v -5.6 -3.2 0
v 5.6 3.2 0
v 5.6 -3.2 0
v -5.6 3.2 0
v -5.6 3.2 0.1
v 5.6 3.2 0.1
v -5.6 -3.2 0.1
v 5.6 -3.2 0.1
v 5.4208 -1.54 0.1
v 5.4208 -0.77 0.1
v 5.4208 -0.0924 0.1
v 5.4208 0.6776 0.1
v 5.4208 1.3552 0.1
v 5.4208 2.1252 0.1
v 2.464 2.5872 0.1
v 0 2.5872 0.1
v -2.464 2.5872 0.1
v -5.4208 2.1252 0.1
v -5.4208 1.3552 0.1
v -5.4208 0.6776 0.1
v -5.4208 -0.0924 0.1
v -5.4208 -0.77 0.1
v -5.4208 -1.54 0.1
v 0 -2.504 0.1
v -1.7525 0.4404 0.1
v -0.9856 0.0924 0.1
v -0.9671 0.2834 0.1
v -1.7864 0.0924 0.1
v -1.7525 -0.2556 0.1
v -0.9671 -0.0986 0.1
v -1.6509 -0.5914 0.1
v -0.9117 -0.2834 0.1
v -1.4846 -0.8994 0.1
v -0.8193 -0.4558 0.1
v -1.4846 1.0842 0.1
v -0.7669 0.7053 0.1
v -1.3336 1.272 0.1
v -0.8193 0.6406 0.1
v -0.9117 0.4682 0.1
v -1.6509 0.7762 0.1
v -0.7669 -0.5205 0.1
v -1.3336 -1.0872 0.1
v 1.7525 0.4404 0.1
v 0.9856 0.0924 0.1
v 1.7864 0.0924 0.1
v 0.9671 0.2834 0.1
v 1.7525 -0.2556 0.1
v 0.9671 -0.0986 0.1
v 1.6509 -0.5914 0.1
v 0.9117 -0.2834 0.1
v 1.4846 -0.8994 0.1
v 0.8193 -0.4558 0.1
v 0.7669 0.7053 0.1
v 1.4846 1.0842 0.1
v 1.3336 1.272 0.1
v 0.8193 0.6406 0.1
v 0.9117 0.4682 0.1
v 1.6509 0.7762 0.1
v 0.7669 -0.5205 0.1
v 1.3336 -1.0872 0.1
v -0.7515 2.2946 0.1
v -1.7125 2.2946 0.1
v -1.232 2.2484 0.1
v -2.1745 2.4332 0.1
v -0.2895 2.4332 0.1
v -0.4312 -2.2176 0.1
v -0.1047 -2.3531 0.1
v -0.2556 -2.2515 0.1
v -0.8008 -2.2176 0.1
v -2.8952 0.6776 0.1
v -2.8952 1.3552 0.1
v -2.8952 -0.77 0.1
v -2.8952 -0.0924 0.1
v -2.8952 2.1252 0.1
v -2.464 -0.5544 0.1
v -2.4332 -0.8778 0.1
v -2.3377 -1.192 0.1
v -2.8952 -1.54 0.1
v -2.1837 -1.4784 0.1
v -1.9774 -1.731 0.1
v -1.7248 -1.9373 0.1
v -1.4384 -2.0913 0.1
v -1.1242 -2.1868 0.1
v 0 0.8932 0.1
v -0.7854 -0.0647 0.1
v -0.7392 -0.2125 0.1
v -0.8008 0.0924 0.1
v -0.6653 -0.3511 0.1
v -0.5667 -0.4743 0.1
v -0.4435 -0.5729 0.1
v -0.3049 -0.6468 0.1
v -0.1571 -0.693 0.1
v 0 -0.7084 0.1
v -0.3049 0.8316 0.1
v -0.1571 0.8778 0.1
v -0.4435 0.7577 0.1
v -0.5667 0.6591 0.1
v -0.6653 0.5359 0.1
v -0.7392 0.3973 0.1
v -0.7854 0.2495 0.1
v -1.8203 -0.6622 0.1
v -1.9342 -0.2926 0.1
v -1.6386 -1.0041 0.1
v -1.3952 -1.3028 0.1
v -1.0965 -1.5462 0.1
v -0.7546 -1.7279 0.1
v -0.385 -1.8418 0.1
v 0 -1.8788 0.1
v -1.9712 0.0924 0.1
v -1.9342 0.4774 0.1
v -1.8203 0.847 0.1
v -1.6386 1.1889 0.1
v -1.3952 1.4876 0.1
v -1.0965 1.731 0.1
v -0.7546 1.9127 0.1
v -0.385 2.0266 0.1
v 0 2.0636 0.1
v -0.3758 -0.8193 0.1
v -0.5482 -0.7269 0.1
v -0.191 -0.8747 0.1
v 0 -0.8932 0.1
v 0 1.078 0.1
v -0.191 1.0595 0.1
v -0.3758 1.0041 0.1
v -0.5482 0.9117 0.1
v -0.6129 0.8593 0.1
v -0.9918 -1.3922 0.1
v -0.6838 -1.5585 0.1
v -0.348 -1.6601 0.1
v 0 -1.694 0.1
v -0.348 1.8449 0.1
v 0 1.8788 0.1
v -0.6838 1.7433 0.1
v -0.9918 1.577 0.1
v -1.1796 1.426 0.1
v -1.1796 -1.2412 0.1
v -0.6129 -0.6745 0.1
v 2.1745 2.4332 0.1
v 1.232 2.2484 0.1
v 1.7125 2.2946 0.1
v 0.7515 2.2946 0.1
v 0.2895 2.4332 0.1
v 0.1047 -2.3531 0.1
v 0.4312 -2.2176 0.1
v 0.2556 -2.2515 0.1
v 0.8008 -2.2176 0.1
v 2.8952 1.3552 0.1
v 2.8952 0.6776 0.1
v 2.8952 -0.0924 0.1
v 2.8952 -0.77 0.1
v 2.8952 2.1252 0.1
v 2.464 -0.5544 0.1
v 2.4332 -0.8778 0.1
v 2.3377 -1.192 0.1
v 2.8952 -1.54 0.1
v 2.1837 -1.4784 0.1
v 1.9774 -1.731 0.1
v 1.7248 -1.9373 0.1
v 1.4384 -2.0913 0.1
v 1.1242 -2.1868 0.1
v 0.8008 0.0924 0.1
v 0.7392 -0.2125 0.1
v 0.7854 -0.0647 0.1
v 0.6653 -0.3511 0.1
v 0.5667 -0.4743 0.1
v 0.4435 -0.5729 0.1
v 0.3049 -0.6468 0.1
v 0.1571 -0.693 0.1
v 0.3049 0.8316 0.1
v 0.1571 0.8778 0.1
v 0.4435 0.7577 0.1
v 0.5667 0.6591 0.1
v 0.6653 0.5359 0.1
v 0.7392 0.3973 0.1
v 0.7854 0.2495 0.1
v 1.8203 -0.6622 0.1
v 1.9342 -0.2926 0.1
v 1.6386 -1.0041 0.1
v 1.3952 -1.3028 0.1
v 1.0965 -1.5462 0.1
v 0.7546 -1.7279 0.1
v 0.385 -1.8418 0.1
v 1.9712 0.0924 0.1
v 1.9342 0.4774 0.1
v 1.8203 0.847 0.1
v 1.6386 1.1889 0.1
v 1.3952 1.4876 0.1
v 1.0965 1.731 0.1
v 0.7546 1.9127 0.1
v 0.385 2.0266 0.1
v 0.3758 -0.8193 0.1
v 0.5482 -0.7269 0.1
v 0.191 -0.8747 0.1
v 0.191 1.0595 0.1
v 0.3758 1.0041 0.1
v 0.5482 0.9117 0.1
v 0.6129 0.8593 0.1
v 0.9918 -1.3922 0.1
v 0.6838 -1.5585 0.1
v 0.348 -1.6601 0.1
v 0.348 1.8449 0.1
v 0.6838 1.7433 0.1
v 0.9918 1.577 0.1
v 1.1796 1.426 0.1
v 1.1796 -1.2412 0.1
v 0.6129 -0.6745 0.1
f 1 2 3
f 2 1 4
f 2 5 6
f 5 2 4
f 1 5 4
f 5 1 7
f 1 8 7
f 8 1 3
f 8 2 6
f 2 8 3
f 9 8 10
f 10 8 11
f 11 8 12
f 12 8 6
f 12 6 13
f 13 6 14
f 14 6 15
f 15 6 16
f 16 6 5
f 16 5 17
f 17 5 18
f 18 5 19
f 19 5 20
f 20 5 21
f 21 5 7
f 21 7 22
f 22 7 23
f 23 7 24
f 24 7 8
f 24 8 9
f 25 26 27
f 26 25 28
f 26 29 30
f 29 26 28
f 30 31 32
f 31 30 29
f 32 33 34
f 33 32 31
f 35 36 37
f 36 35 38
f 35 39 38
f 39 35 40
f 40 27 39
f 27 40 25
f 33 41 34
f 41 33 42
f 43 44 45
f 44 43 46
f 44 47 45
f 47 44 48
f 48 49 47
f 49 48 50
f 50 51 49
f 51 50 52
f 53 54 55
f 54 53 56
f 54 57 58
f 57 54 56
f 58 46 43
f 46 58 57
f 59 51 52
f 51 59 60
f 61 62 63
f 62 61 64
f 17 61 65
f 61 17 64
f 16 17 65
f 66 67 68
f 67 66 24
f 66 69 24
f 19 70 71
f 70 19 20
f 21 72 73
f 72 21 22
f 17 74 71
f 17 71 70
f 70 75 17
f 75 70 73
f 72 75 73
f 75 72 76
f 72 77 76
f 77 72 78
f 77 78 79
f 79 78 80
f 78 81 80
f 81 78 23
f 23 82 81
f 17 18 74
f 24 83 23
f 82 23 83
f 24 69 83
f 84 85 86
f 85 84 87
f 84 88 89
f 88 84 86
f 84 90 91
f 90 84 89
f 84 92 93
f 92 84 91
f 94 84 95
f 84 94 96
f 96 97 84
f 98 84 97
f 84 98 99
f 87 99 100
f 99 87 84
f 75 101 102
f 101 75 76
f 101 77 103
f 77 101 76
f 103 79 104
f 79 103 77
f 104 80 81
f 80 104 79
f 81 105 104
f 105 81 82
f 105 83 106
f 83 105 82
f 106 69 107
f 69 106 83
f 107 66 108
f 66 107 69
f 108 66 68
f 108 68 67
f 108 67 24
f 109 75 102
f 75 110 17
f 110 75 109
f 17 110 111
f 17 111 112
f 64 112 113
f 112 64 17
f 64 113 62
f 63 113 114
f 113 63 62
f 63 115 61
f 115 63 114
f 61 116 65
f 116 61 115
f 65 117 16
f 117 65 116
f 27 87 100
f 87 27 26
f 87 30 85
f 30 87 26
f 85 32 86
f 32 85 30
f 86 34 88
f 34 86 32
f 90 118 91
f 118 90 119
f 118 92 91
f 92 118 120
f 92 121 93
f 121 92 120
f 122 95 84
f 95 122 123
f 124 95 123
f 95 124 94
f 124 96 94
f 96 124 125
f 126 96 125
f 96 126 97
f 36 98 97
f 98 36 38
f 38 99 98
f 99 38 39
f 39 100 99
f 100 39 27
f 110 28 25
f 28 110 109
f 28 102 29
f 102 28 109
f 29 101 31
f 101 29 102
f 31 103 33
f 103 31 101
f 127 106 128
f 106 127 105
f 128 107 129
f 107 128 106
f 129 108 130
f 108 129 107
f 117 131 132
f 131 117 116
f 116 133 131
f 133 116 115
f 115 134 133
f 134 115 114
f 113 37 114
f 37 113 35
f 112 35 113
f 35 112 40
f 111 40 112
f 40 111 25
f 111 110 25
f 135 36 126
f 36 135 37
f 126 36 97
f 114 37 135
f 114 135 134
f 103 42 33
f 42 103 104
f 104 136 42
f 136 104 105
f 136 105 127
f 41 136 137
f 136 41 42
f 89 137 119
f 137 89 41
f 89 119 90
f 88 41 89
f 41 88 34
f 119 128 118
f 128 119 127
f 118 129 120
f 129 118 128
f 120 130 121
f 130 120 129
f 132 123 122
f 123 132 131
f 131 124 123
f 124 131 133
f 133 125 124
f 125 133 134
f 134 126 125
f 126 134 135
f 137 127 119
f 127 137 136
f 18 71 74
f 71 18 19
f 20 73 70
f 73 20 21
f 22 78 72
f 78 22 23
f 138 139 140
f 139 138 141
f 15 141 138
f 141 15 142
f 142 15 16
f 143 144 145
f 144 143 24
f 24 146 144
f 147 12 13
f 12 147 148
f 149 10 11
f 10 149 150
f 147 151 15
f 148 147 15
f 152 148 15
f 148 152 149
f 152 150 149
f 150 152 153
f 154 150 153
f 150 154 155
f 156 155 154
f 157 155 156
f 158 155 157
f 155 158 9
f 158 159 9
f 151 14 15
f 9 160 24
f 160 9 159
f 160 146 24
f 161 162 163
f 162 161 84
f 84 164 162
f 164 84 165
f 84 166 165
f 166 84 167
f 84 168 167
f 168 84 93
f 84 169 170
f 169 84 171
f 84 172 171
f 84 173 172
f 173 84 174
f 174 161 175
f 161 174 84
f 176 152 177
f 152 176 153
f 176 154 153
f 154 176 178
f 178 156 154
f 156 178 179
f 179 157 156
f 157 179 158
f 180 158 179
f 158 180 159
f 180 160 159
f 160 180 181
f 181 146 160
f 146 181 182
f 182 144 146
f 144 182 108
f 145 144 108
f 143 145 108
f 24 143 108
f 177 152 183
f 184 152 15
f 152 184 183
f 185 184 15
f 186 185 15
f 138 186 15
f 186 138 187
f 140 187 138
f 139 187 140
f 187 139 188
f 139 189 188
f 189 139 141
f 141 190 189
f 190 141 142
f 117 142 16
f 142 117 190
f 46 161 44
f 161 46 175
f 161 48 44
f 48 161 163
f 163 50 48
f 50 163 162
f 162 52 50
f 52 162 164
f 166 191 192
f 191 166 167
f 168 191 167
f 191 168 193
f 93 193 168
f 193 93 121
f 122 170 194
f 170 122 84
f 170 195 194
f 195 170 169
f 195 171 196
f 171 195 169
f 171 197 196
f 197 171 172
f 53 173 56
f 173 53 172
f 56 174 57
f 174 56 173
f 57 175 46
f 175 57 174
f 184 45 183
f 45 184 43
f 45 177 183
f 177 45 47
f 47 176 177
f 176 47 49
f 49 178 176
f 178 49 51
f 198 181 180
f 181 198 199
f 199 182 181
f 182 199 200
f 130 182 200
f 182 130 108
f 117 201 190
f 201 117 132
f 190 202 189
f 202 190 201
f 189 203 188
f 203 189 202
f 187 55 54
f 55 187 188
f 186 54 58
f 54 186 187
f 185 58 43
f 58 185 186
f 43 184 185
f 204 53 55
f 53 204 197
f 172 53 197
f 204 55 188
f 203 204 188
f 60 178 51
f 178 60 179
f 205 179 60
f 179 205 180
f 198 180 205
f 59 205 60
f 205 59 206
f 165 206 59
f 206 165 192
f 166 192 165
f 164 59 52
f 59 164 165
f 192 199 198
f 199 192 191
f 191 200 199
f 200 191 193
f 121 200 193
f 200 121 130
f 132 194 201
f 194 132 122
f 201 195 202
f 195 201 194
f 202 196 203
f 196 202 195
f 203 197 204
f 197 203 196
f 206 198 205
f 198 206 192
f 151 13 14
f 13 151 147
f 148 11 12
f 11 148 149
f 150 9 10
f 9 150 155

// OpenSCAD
// file: s/169625as02.scad
use <../../lib.scad>
function ldraw_lib__s__169625as02() = [
// 0 ~Coast Guard (1995) Logo with Three Red Horizontal Stripes and Life Saver on Blue Crest - Quarter of Life Saver
// 0 Name: s\169625as02.dat
// 0 Author: Max Martin Richter [MMR1988]
// 0 !LDRAW_ORG Subpart UPDATE 2024-08
// 0 !LICENSE Licensed under CC BY 4.0 : see CAreadme.txt
// 
// 0 BFC CERTIFY CCW
  [0,"BFC","CERTIFY"],
  [0,"BFC","CCW"],
// 
// 0 !HISTORY 2024-09-30 [OrionP] Official Update 2024-08
// 
// 
// 4 16 -3.2 0 .3 -3.14 0 .92 -5.69 0 1.43 -5.8 0 .3
  [4,16,-3.2,0,.3,-3.14,0,.92,-5.69,0,1.43,-5.8,0,.3],
// 4 16 -3.14 0 -.32 -3.2 0 .3 -5.8 0 .3 -5.69 0 -.83
  [4,16,-3.14,0,-.32,-3.2,0,.3,-5.8,0,.3,-5.69,0,-.83],
// 4 16 -2.96 0 -.92 -3.14 0 -.32 -5.69 0 -.83 -5.36 0 -1.92
  [4,16,-2.96,0,-.92,-3.14,0,-.32,-5.69,0,-.83,-5.36,0,-1.92],
// 4 16 -2.66 0 -1.48 -2.96 0 -.92 -5.36 0 -1.92 -4.82 0 -2.92
  [4,16,-2.66,0,-1.48,-2.96,0,-.92,-5.36,0,-1.92,-4.82,0,-2.92],
// 4 16 -2.66 0 2.08 -2.49 0 2.29 -4.33 0 4.13 -4.82 0 3.52
  [4,16,-2.66,0,2.08,-2.49,0,2.29,-4.33,0,4.13,-4.82,0,3.52],
// 4 16 -2.96 0 1.52 -2.66 0 2.08 -4.82 0 3.52 -5.36 0 2.52
  [4,16,-2.96,0,1.52,-2.66,0,2.08,-4.82,0,3.52,-5.36,0,2.52],
// 4 16 -3.14 0 .92 -2.96 0 1.52 -5.36 0 2.52 -5.69 0 1.43
  [4,16,-3.14,0,.92,-2.96,0,1.52,-5.36,0,2.52,-5.69,0,1.43],
// 4 16 -4.33 0 -3.53 -2.49 0 -1.69 -2.66 0 -1.48 -4.82 0 -2.92
  [4,16,-4.33,0,-3.53,-2.49,0,-1.69,-2.66,0,-1.48,-4.82,0,-2.92],
];
module ldraw_lib__s__169625as02(step=0, col=false, unit=2/5, alt=false, line=0.2, solid=!$preview)
    makepoly(ldraw_lib__s__169625as02(), step=step, col=col, unit=unit, alt=alt, line=line, solid=solid);
ldraw_lib__s__169625as02(line=0.2);
// file: ../p/box5-12.scad
use <../lib.scad>
function ldraw_lib__box5_12() = [
// 0 Box with 5 Faces without Any Edges
// 0 Name: box5-12.dat
// 0 Author: Chris Dee [cwdee]
// 0 !LDRAW_ORG Primitive UPDATE 2009-02
// 0 !LICENSE Licensed under CC BY 4.0 : see CAreadme.txt
// 
// 0 BFC CERTIFY CCW
  [0,"BFC","CERTIFY"],
  [0,"BFC","CCW"],
// 
// 0 !HISTORY 2009-09-03 [PTadmin] Official Update 2009-02
// 
// 
// 4 16 1 1 1 1 1 -1 -1 1 -1 -1 1 1
  [4,16,1,1,1,1,1,-1,-1,1,-1,-1,1,1],
// 4 16 -1 0 1 1 0 1 1 1 1 -1 1 1
  [4,16,-1,0,1,1,0,1,1,1,1,-1,1,1],
// 4 16 -1 0 -1 -1 0 1 -1 1 1 -1 1 -1
  [4,16,-1,0,-1,-1,0,1,-1,1,1,-1,1,-1],
// 4 16 1 0 -1 -1 0 -1 -1 1 -1 1 1 -1
  [4,16,1,0,-1,-1,0,-1,-1,1,-1,1,1,-1],
// 4 16 1 0 1 1 0 -1 1 1 -1 1 1 1
  [4,16,1,0,1,1,0,-1,1,1,-1,1,1,1],
// 0
];
module ldraw_lib__box5_12(step=0, col=false, unit=2/5, alt=false, line=0.2, solid=!$preview)
    makepoly(ldraw_lib__box5_12(), step=step, col=col, unit=unit, alt=alt, line=line, solid=solid);
ldraw_lib__box5_12(line=0.2);
// main file
use <../lib.scad>
use <../p/box5-12.scad>
use <s/169625as01.scad>
use <s/169625as02.scad>
function ldraw_lib__169625a() = [
// 0 Sticker  0.8 x  1.4 with Coast Guard (1995) Logo
// 0 Name: 169625a.dat
// 0 Author: Gerald Lasser [GeraldLasser]
// 0 !LDRAW_ORG Part UPDATE 2024-08
// 0 !LICENSE Licensed under CC BY 4.0 : see CAreadme.txt
// 
// 0 BFC CERTIFY CCW
  [0,"BFC","CERTIFY"],
  [0,"BFC","CCW"],
// 
// 0 !KEYWORDS Bricklink 6338stk01, Brickowl 143926, Rebrickable 169625, Set 6338
// 
// 0 !HISTORY 2022-12-31 [MMR1988] Used s02 for correct colouring, removed NOCLIP statement
// 0 !HISTORY 2024-09-30 [OrionP] Official Update 2024-08
// 
// 
// 1 16 0 -.25 0 14 0 0 0 .25 0 0 0 8 box5-12.dat
  [1,16,0,-.25,0,14,0,0,0,.25,0,0,0,8, ldraw_lib__box5_12()],
// 
// 3 16 13.552 -.25 -3.85 14 -.25 -8 13.552 -.25 -1.925
  [3,16,13.552,-.25,-3.85,14,-.25,-8,13.552,-.25,-1.925],
// 3 16 13.552 -.25 -1.925 14 -.25 -8 13.552 -.25 -.231
  [3,16,13.552,-.25,-1.925,14,-.25,-8,13.552,-.25,-.231],
// 3 16 13.552 -.25 -.231 14 -.25 -8 13.552 -.25 1.694
  [3,16,13.552,-.25,-.231,14,-.25,-8,13.552,-.25,1.694],
// 3 16 13.552 -.25 1.694 14 -.25 -8 14 -.25 8
  [3,16,13.552,-.25,1.694,14,-.25,-8,14,-.25,8],
// 3 16 13.552 -.25 1.694 14 -.25 8 13.552 -.25 3.388
  [3,16,13.552,-.25,1.694,14,-.25,8,13.552,-.25,3.388],
// 3 16 13.552 -.25 3.388 14 -.25 8 13.552 -.25 5.313
  [3,16,13.552,-.25,3.388,14,-.25,8,13.552,-.25,5.313],
// 3 16 13.552 -.25 5.313 14 -.25 8 6.16 -.25 6.468
  [3,16,13.552,-.25,5.313,14,-.25,8,6.16,-.25,6.468],
// 3 16 6.16 -.25 6.468 14 -.25 8 0 -.25 6.468
  [3,16,6.16,-.25,6.468,14,-.25,8,0,-.25,6.468],
// 3 16 0 -.25 6.468 14 -.25 8 -14 -.25 8
  [3,16,0,-.25,6.468,14,-.25,8,-14,-.25,8],
// 3 16 0 -.25 6.468 -14 -.25 8 -6.16 -.25 6.468
  [3,16,0,-.25,6.468,-14,-.25,8,-6.16,-.25,6.468],
// 3 16 -6.16 -.25 6.468 -14 -.25 8 -13.552 -.25 5.313
  [3,16,-6.16,-.25,6.468,-14,-.25,8,-13.552,-.25,5.313],
// 3 16 -13.552 -.25 5.313 -14 -.25 8 -13.552 -.25 3.388
  [3,16,-13.552,-.25,5.313,-14,-.25,8,-13.552,-.25,3.388],
// 3 16 -13.552 -.25 3.388 -14 -.25 8 -13.552 -.25 1.694
  [3,16,-13.552,-.25,3.388,-14,-.25,8,-13.552,-.25,1.694],
// 3 16 -13.552 -.25 1.694 -14 -.25 8 -13.552 -.25 -.231
  [3,16,-13.552,-.25,1.694,-14,-.25,8,-13.552,-.25,-.231],
// 3 16 -13.552 -.25 -.231 -14 -.25 8 -14 -.25 -8
  [3,16,-13.552,-.25,-.231,-14,-.25,8,-14,-.25,-8],
// 3 16 -13.552 -.25 -.231 -14 -.25 -8 -13.552 -.25 -1.925
  [3,16,-13.552,-.25,-.231,-14,-.25,-8,-13.552,-.25,-1.925],
// 3 16 -13.552 -.25 -1.925 -14 -.25 -8 -13.552 -.25 -3.85
  [3,16,-13.552,-.25,-1.925,-14,-.25,-8,-13.552,-.25,-3.85],
// 3 16 -13.552 -.25 -3.85 -14 -.25 -8 0 -.25 -6.2601
  [3,16,-13.552,-.25,-3.85,-14,-.25,-8,0,-.25,-6.2601],
// 3 16 0 -.25 -6.2601 -14 -.25 -8 14 -.25 -8
  [3,16,0,-.25,-6.2601,-14,-.25,-8,14,-.25,-8],
// 3 16 0 -.25 -6.2601 14 -.25 -8 13.552 -.25 -3.85
  [3,16,0,-.25,-6.2601,14,-.25,-8,13.552,-.25,-3.85],
// 
// 1 16 0 -.25 0 .77 0 0 0 1 0 0 0 .77 s\169625as02.dat
  [1,16,0,-.25,0,.77,0,0,0,1,0,0,0,.77, ldraw_lib__s__169625as02()],
// 1 16 0 -.25 0 -.77 0 0 0 1 0 0 0 .77 s\169625as02.dat
  [1,16,0,-.25,0,-.77,0,0,0,1,0,0,0,.77, ldraw_lib__s__169625as02()],
// 
// 1 16 0 -.25 0 .77 0 0 0 1 0 0 0 .77 s\169625as01.dat
  [1,16,0,-.25,0,.77,0,0,0,1,0,0,0,.77, ldraw_lib__s__169625as01()],
// 1 16 0 -.25 0 -.77 0 0 0 1 0 0 0 .77 s\169625as01.dat
  [1,16,0,-.25,0,-.77,0,0,0,1,0,0,0,.77, ldraw_lib__s__169625as01()],
];
module ldraw_lib__169625a(step=0, col=false, unit=2/5, alt=false, line=0.2, solid=!$preview)
    makepoly(ldraw_lib__169625a(), step=step, col=col, unit=unit, alt=alt, line=line, solid=solid);
ldraw_lib__169625a(line=0.2);
